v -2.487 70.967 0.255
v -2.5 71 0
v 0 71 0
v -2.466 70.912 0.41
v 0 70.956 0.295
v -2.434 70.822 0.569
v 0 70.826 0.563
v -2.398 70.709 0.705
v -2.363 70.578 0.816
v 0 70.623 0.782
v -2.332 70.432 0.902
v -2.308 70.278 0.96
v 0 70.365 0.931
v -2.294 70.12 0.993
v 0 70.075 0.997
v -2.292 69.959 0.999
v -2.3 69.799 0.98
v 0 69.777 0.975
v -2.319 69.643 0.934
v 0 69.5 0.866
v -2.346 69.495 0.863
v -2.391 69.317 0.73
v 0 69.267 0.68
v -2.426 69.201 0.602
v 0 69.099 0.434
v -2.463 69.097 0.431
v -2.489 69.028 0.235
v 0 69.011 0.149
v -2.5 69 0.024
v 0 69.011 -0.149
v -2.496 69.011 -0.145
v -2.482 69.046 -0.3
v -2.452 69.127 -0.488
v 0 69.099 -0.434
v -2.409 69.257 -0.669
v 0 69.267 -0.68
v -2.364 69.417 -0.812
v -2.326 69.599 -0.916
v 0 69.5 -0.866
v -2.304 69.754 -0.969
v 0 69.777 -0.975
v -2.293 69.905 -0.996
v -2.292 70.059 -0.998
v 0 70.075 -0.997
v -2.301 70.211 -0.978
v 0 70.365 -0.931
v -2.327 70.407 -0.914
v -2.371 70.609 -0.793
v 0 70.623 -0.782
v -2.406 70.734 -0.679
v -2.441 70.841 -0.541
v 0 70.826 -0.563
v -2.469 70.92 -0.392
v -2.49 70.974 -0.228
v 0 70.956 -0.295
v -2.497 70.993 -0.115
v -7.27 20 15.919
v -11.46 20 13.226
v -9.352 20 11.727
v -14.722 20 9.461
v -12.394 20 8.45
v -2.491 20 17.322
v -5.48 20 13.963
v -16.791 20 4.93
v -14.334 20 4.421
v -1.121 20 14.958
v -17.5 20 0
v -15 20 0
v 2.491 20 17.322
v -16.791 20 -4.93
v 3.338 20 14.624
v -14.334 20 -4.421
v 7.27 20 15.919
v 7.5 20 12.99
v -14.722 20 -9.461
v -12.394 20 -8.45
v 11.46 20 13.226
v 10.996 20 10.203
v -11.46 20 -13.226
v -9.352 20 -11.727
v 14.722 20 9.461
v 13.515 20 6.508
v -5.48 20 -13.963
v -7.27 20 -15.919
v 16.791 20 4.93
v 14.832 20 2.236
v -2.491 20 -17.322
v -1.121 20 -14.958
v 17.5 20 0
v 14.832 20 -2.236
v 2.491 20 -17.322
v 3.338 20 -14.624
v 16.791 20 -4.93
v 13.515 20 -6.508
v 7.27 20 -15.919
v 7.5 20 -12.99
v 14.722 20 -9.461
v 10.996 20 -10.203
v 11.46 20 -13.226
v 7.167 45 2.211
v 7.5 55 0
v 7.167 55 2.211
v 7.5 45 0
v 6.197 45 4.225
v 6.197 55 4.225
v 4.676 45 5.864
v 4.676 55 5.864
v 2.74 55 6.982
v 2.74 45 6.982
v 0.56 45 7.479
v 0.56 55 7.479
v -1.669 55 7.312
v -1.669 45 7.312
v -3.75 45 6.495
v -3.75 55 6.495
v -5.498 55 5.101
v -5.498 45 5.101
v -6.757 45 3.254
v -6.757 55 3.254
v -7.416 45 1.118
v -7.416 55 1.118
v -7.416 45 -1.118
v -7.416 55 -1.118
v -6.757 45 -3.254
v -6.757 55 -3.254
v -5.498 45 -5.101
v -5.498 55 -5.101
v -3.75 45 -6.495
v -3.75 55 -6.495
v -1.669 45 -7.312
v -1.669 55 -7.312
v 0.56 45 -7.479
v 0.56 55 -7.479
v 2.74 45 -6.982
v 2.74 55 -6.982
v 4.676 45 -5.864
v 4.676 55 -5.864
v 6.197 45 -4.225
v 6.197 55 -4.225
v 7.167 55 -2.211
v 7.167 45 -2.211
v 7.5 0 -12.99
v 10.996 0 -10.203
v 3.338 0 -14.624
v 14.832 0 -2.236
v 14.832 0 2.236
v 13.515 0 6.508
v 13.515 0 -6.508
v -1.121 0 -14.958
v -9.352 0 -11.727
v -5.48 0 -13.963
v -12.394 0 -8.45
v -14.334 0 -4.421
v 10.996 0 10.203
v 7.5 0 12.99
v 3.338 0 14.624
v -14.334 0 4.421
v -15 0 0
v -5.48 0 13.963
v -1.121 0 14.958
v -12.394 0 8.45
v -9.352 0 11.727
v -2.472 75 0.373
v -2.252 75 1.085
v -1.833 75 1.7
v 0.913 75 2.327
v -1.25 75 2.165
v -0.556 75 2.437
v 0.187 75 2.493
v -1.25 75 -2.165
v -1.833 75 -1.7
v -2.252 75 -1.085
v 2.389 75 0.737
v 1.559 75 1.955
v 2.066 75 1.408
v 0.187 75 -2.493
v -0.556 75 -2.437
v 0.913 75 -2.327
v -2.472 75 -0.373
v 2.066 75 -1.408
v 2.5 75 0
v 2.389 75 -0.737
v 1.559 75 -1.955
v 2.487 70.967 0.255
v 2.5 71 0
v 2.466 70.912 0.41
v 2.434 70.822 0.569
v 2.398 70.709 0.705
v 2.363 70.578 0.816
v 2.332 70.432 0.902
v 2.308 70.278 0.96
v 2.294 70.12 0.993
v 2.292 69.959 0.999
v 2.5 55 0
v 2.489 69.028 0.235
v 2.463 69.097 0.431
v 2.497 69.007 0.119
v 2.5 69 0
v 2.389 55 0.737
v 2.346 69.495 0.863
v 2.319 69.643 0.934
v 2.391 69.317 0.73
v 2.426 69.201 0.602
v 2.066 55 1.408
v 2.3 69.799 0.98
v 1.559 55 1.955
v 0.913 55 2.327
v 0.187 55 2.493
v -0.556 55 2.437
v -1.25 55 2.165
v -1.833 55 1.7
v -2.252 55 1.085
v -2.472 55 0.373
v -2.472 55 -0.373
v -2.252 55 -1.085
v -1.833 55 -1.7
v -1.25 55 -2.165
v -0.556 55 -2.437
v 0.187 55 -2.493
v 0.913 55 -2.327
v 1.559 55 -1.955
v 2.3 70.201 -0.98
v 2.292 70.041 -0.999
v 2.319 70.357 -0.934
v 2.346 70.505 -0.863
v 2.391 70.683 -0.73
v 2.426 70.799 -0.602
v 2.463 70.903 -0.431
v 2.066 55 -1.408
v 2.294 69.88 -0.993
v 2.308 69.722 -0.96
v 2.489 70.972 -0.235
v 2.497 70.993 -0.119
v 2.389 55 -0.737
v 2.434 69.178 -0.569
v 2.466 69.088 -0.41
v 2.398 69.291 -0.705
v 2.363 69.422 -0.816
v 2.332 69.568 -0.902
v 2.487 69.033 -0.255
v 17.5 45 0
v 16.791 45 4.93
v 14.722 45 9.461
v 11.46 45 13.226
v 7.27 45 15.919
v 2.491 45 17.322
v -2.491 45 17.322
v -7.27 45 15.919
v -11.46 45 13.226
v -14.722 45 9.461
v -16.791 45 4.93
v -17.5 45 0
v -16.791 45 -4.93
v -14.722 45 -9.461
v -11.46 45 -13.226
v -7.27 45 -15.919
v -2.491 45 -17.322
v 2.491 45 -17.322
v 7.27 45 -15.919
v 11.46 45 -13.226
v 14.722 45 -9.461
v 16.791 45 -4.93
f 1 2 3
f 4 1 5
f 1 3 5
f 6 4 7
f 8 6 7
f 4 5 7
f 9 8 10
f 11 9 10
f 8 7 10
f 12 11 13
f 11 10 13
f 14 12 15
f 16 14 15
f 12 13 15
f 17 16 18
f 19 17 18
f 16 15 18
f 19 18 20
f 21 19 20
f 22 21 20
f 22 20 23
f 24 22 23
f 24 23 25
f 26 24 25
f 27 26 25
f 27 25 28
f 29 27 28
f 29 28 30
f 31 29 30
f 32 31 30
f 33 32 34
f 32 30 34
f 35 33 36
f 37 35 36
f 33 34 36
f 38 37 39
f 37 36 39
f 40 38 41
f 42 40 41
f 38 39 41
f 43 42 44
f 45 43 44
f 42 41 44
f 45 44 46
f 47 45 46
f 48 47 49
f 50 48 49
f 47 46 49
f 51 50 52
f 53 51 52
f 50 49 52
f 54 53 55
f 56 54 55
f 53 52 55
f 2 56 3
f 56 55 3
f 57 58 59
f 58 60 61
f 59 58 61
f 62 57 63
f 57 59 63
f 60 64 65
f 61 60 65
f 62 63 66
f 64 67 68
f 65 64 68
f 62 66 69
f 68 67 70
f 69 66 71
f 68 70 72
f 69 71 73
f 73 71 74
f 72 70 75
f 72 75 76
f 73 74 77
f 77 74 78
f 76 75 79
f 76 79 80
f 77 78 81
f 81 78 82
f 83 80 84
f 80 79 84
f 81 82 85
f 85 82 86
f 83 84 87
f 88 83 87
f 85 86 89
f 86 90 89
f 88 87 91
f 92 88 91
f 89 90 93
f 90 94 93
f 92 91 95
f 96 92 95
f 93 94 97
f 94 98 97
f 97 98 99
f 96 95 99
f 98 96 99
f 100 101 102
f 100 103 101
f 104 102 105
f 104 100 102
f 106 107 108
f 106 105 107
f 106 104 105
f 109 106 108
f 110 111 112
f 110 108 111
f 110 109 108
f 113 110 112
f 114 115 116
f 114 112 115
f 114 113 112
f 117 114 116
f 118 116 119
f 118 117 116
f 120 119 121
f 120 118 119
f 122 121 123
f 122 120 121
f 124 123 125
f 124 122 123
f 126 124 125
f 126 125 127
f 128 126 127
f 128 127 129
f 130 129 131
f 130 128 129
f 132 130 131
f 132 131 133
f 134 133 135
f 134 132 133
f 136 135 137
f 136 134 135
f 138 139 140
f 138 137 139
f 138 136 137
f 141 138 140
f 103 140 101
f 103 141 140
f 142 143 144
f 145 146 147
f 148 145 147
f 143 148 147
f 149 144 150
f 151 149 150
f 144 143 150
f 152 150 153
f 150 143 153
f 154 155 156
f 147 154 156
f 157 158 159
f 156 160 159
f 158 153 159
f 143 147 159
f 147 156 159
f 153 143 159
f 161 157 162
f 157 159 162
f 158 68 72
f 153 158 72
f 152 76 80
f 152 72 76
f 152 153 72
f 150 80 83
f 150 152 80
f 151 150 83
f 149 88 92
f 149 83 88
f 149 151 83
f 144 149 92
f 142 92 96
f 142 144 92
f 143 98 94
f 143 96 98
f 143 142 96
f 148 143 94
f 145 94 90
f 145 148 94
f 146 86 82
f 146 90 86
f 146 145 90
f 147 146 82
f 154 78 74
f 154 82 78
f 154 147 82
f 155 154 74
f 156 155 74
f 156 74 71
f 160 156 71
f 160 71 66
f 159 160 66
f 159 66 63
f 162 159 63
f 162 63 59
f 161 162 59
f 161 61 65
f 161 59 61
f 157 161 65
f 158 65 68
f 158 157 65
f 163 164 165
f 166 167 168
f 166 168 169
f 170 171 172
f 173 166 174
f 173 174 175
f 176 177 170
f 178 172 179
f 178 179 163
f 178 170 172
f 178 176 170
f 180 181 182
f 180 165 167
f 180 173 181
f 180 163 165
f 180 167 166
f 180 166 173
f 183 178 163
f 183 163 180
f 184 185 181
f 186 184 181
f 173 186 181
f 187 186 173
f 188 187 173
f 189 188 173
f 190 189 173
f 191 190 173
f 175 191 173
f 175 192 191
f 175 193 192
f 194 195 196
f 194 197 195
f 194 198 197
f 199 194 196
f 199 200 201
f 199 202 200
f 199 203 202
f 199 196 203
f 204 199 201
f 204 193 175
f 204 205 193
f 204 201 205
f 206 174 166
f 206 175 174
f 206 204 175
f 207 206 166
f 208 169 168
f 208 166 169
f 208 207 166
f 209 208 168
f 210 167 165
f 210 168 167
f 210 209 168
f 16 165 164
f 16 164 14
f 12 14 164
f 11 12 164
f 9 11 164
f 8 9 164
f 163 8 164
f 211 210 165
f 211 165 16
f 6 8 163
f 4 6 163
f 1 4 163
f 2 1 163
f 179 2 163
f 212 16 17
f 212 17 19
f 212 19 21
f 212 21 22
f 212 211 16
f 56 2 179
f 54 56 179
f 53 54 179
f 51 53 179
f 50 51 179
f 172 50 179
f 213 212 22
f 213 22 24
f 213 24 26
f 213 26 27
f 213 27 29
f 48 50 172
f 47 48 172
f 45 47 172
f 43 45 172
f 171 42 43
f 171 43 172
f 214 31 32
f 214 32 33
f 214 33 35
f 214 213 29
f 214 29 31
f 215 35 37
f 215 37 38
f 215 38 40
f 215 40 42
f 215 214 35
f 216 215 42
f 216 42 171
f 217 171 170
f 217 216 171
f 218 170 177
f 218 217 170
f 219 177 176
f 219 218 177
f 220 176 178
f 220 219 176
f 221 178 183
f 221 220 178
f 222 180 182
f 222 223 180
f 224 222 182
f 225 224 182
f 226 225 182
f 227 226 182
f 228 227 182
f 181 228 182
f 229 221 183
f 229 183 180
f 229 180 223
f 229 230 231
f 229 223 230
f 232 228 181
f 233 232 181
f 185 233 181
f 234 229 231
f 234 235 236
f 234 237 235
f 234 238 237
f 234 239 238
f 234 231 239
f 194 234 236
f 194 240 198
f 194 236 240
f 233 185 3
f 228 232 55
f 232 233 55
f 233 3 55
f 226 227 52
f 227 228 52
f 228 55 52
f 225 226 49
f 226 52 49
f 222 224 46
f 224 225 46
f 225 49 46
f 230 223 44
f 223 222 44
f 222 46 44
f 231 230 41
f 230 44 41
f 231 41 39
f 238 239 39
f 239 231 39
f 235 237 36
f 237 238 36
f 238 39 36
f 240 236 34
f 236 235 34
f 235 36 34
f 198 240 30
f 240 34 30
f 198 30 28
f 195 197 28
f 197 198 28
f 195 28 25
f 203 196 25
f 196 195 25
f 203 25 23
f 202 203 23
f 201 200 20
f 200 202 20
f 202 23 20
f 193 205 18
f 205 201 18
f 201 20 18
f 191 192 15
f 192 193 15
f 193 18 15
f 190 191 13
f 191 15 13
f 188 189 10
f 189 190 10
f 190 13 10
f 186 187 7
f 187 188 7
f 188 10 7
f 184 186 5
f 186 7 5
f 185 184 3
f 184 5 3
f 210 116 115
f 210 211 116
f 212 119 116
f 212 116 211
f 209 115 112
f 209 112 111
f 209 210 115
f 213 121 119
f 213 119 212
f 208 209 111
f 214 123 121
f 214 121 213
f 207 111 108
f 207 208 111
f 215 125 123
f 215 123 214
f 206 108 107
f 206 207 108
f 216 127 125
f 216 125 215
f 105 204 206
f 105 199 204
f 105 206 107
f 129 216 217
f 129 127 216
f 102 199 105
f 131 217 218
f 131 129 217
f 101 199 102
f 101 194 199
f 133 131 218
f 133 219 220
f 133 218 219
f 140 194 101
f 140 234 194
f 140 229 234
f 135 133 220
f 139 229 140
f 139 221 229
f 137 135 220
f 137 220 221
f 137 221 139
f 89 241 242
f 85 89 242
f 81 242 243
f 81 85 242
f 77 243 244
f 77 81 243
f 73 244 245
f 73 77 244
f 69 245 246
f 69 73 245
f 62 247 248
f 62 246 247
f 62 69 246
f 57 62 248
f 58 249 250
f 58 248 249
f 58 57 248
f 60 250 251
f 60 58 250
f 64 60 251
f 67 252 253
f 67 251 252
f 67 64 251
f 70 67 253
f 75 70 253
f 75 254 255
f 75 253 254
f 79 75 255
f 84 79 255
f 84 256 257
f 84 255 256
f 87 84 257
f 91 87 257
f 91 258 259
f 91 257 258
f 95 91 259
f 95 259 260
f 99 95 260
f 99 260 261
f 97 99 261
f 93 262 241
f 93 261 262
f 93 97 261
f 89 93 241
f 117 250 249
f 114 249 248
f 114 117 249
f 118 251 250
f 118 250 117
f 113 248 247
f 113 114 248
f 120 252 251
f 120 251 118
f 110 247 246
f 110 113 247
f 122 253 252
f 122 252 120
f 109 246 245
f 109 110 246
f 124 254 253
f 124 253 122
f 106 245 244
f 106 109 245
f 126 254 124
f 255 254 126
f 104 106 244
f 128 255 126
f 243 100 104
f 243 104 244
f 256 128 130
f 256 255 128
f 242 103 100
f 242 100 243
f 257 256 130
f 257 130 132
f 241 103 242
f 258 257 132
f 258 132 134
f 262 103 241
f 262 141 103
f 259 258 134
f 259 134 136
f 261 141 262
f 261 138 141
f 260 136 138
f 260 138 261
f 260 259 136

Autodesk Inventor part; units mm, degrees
ref_plane "YZ Plane" through (0, 0, 0) normal (1, 0, 0) x (0, 1, 0)
ref_plane "XZ Plane" through (0, 0, 0) normal (0, 1, 0) x (-1, 0, 0)
ref_plane "XY Plane" through (0, 0, 0) normal (0, 0, 1) x (1, 0, 0)
sketch "Sketch1" plane through (0, 0, 0) normal (0, 1, 0) x (-1, 0, 0)
  circle A0 centre (0, 0) radius 15
  dimension "d0" = 30
extrude "Extrusion1" add sketch "Sketch1" along normal blind 20
sketch "Sketch2" plane through (0, 20, 0) normal (0, 1, 0) x (1, 0, 0)
  circle A0 centre (0, 0) radius 17.5
  dimension "d3" = 35
extrude "Extrusion2" add sketch "Sketch2" along normal blind 25
sketch "Sketch3" plane through (0, 45, 0) normal (0, 1, 0) x (1, 0, 0)
  circle A0 centre (0, 0) radius 7.5
  dimension "d6" = 15
extrude "Extrusion3" add sketch "Sketch3" along normal blind 10
sketch "Sketch4" plane through (0, 55, 0) normal (0, 1, 0) x (1, 0, 0)
  circle A0 centre (0, 0) radius 2.5
  dimension "d9" = 5
extrude "Extrusion4" add sketch "Sketch4" along normal blind 20
sketch "Sketch5" plane through (0, 0, 0) normal (1, 0, 0) x (0, 1, 0)
  circle A0 centre (70, 0) radius 1
  point P0 (0, 0)
  dimension "d12" = 2
extrude "Extrusion5" cut sketch "Sketch5" along normal mid plane 10
properties part number "trail 8" material "Iron, Malleable"
